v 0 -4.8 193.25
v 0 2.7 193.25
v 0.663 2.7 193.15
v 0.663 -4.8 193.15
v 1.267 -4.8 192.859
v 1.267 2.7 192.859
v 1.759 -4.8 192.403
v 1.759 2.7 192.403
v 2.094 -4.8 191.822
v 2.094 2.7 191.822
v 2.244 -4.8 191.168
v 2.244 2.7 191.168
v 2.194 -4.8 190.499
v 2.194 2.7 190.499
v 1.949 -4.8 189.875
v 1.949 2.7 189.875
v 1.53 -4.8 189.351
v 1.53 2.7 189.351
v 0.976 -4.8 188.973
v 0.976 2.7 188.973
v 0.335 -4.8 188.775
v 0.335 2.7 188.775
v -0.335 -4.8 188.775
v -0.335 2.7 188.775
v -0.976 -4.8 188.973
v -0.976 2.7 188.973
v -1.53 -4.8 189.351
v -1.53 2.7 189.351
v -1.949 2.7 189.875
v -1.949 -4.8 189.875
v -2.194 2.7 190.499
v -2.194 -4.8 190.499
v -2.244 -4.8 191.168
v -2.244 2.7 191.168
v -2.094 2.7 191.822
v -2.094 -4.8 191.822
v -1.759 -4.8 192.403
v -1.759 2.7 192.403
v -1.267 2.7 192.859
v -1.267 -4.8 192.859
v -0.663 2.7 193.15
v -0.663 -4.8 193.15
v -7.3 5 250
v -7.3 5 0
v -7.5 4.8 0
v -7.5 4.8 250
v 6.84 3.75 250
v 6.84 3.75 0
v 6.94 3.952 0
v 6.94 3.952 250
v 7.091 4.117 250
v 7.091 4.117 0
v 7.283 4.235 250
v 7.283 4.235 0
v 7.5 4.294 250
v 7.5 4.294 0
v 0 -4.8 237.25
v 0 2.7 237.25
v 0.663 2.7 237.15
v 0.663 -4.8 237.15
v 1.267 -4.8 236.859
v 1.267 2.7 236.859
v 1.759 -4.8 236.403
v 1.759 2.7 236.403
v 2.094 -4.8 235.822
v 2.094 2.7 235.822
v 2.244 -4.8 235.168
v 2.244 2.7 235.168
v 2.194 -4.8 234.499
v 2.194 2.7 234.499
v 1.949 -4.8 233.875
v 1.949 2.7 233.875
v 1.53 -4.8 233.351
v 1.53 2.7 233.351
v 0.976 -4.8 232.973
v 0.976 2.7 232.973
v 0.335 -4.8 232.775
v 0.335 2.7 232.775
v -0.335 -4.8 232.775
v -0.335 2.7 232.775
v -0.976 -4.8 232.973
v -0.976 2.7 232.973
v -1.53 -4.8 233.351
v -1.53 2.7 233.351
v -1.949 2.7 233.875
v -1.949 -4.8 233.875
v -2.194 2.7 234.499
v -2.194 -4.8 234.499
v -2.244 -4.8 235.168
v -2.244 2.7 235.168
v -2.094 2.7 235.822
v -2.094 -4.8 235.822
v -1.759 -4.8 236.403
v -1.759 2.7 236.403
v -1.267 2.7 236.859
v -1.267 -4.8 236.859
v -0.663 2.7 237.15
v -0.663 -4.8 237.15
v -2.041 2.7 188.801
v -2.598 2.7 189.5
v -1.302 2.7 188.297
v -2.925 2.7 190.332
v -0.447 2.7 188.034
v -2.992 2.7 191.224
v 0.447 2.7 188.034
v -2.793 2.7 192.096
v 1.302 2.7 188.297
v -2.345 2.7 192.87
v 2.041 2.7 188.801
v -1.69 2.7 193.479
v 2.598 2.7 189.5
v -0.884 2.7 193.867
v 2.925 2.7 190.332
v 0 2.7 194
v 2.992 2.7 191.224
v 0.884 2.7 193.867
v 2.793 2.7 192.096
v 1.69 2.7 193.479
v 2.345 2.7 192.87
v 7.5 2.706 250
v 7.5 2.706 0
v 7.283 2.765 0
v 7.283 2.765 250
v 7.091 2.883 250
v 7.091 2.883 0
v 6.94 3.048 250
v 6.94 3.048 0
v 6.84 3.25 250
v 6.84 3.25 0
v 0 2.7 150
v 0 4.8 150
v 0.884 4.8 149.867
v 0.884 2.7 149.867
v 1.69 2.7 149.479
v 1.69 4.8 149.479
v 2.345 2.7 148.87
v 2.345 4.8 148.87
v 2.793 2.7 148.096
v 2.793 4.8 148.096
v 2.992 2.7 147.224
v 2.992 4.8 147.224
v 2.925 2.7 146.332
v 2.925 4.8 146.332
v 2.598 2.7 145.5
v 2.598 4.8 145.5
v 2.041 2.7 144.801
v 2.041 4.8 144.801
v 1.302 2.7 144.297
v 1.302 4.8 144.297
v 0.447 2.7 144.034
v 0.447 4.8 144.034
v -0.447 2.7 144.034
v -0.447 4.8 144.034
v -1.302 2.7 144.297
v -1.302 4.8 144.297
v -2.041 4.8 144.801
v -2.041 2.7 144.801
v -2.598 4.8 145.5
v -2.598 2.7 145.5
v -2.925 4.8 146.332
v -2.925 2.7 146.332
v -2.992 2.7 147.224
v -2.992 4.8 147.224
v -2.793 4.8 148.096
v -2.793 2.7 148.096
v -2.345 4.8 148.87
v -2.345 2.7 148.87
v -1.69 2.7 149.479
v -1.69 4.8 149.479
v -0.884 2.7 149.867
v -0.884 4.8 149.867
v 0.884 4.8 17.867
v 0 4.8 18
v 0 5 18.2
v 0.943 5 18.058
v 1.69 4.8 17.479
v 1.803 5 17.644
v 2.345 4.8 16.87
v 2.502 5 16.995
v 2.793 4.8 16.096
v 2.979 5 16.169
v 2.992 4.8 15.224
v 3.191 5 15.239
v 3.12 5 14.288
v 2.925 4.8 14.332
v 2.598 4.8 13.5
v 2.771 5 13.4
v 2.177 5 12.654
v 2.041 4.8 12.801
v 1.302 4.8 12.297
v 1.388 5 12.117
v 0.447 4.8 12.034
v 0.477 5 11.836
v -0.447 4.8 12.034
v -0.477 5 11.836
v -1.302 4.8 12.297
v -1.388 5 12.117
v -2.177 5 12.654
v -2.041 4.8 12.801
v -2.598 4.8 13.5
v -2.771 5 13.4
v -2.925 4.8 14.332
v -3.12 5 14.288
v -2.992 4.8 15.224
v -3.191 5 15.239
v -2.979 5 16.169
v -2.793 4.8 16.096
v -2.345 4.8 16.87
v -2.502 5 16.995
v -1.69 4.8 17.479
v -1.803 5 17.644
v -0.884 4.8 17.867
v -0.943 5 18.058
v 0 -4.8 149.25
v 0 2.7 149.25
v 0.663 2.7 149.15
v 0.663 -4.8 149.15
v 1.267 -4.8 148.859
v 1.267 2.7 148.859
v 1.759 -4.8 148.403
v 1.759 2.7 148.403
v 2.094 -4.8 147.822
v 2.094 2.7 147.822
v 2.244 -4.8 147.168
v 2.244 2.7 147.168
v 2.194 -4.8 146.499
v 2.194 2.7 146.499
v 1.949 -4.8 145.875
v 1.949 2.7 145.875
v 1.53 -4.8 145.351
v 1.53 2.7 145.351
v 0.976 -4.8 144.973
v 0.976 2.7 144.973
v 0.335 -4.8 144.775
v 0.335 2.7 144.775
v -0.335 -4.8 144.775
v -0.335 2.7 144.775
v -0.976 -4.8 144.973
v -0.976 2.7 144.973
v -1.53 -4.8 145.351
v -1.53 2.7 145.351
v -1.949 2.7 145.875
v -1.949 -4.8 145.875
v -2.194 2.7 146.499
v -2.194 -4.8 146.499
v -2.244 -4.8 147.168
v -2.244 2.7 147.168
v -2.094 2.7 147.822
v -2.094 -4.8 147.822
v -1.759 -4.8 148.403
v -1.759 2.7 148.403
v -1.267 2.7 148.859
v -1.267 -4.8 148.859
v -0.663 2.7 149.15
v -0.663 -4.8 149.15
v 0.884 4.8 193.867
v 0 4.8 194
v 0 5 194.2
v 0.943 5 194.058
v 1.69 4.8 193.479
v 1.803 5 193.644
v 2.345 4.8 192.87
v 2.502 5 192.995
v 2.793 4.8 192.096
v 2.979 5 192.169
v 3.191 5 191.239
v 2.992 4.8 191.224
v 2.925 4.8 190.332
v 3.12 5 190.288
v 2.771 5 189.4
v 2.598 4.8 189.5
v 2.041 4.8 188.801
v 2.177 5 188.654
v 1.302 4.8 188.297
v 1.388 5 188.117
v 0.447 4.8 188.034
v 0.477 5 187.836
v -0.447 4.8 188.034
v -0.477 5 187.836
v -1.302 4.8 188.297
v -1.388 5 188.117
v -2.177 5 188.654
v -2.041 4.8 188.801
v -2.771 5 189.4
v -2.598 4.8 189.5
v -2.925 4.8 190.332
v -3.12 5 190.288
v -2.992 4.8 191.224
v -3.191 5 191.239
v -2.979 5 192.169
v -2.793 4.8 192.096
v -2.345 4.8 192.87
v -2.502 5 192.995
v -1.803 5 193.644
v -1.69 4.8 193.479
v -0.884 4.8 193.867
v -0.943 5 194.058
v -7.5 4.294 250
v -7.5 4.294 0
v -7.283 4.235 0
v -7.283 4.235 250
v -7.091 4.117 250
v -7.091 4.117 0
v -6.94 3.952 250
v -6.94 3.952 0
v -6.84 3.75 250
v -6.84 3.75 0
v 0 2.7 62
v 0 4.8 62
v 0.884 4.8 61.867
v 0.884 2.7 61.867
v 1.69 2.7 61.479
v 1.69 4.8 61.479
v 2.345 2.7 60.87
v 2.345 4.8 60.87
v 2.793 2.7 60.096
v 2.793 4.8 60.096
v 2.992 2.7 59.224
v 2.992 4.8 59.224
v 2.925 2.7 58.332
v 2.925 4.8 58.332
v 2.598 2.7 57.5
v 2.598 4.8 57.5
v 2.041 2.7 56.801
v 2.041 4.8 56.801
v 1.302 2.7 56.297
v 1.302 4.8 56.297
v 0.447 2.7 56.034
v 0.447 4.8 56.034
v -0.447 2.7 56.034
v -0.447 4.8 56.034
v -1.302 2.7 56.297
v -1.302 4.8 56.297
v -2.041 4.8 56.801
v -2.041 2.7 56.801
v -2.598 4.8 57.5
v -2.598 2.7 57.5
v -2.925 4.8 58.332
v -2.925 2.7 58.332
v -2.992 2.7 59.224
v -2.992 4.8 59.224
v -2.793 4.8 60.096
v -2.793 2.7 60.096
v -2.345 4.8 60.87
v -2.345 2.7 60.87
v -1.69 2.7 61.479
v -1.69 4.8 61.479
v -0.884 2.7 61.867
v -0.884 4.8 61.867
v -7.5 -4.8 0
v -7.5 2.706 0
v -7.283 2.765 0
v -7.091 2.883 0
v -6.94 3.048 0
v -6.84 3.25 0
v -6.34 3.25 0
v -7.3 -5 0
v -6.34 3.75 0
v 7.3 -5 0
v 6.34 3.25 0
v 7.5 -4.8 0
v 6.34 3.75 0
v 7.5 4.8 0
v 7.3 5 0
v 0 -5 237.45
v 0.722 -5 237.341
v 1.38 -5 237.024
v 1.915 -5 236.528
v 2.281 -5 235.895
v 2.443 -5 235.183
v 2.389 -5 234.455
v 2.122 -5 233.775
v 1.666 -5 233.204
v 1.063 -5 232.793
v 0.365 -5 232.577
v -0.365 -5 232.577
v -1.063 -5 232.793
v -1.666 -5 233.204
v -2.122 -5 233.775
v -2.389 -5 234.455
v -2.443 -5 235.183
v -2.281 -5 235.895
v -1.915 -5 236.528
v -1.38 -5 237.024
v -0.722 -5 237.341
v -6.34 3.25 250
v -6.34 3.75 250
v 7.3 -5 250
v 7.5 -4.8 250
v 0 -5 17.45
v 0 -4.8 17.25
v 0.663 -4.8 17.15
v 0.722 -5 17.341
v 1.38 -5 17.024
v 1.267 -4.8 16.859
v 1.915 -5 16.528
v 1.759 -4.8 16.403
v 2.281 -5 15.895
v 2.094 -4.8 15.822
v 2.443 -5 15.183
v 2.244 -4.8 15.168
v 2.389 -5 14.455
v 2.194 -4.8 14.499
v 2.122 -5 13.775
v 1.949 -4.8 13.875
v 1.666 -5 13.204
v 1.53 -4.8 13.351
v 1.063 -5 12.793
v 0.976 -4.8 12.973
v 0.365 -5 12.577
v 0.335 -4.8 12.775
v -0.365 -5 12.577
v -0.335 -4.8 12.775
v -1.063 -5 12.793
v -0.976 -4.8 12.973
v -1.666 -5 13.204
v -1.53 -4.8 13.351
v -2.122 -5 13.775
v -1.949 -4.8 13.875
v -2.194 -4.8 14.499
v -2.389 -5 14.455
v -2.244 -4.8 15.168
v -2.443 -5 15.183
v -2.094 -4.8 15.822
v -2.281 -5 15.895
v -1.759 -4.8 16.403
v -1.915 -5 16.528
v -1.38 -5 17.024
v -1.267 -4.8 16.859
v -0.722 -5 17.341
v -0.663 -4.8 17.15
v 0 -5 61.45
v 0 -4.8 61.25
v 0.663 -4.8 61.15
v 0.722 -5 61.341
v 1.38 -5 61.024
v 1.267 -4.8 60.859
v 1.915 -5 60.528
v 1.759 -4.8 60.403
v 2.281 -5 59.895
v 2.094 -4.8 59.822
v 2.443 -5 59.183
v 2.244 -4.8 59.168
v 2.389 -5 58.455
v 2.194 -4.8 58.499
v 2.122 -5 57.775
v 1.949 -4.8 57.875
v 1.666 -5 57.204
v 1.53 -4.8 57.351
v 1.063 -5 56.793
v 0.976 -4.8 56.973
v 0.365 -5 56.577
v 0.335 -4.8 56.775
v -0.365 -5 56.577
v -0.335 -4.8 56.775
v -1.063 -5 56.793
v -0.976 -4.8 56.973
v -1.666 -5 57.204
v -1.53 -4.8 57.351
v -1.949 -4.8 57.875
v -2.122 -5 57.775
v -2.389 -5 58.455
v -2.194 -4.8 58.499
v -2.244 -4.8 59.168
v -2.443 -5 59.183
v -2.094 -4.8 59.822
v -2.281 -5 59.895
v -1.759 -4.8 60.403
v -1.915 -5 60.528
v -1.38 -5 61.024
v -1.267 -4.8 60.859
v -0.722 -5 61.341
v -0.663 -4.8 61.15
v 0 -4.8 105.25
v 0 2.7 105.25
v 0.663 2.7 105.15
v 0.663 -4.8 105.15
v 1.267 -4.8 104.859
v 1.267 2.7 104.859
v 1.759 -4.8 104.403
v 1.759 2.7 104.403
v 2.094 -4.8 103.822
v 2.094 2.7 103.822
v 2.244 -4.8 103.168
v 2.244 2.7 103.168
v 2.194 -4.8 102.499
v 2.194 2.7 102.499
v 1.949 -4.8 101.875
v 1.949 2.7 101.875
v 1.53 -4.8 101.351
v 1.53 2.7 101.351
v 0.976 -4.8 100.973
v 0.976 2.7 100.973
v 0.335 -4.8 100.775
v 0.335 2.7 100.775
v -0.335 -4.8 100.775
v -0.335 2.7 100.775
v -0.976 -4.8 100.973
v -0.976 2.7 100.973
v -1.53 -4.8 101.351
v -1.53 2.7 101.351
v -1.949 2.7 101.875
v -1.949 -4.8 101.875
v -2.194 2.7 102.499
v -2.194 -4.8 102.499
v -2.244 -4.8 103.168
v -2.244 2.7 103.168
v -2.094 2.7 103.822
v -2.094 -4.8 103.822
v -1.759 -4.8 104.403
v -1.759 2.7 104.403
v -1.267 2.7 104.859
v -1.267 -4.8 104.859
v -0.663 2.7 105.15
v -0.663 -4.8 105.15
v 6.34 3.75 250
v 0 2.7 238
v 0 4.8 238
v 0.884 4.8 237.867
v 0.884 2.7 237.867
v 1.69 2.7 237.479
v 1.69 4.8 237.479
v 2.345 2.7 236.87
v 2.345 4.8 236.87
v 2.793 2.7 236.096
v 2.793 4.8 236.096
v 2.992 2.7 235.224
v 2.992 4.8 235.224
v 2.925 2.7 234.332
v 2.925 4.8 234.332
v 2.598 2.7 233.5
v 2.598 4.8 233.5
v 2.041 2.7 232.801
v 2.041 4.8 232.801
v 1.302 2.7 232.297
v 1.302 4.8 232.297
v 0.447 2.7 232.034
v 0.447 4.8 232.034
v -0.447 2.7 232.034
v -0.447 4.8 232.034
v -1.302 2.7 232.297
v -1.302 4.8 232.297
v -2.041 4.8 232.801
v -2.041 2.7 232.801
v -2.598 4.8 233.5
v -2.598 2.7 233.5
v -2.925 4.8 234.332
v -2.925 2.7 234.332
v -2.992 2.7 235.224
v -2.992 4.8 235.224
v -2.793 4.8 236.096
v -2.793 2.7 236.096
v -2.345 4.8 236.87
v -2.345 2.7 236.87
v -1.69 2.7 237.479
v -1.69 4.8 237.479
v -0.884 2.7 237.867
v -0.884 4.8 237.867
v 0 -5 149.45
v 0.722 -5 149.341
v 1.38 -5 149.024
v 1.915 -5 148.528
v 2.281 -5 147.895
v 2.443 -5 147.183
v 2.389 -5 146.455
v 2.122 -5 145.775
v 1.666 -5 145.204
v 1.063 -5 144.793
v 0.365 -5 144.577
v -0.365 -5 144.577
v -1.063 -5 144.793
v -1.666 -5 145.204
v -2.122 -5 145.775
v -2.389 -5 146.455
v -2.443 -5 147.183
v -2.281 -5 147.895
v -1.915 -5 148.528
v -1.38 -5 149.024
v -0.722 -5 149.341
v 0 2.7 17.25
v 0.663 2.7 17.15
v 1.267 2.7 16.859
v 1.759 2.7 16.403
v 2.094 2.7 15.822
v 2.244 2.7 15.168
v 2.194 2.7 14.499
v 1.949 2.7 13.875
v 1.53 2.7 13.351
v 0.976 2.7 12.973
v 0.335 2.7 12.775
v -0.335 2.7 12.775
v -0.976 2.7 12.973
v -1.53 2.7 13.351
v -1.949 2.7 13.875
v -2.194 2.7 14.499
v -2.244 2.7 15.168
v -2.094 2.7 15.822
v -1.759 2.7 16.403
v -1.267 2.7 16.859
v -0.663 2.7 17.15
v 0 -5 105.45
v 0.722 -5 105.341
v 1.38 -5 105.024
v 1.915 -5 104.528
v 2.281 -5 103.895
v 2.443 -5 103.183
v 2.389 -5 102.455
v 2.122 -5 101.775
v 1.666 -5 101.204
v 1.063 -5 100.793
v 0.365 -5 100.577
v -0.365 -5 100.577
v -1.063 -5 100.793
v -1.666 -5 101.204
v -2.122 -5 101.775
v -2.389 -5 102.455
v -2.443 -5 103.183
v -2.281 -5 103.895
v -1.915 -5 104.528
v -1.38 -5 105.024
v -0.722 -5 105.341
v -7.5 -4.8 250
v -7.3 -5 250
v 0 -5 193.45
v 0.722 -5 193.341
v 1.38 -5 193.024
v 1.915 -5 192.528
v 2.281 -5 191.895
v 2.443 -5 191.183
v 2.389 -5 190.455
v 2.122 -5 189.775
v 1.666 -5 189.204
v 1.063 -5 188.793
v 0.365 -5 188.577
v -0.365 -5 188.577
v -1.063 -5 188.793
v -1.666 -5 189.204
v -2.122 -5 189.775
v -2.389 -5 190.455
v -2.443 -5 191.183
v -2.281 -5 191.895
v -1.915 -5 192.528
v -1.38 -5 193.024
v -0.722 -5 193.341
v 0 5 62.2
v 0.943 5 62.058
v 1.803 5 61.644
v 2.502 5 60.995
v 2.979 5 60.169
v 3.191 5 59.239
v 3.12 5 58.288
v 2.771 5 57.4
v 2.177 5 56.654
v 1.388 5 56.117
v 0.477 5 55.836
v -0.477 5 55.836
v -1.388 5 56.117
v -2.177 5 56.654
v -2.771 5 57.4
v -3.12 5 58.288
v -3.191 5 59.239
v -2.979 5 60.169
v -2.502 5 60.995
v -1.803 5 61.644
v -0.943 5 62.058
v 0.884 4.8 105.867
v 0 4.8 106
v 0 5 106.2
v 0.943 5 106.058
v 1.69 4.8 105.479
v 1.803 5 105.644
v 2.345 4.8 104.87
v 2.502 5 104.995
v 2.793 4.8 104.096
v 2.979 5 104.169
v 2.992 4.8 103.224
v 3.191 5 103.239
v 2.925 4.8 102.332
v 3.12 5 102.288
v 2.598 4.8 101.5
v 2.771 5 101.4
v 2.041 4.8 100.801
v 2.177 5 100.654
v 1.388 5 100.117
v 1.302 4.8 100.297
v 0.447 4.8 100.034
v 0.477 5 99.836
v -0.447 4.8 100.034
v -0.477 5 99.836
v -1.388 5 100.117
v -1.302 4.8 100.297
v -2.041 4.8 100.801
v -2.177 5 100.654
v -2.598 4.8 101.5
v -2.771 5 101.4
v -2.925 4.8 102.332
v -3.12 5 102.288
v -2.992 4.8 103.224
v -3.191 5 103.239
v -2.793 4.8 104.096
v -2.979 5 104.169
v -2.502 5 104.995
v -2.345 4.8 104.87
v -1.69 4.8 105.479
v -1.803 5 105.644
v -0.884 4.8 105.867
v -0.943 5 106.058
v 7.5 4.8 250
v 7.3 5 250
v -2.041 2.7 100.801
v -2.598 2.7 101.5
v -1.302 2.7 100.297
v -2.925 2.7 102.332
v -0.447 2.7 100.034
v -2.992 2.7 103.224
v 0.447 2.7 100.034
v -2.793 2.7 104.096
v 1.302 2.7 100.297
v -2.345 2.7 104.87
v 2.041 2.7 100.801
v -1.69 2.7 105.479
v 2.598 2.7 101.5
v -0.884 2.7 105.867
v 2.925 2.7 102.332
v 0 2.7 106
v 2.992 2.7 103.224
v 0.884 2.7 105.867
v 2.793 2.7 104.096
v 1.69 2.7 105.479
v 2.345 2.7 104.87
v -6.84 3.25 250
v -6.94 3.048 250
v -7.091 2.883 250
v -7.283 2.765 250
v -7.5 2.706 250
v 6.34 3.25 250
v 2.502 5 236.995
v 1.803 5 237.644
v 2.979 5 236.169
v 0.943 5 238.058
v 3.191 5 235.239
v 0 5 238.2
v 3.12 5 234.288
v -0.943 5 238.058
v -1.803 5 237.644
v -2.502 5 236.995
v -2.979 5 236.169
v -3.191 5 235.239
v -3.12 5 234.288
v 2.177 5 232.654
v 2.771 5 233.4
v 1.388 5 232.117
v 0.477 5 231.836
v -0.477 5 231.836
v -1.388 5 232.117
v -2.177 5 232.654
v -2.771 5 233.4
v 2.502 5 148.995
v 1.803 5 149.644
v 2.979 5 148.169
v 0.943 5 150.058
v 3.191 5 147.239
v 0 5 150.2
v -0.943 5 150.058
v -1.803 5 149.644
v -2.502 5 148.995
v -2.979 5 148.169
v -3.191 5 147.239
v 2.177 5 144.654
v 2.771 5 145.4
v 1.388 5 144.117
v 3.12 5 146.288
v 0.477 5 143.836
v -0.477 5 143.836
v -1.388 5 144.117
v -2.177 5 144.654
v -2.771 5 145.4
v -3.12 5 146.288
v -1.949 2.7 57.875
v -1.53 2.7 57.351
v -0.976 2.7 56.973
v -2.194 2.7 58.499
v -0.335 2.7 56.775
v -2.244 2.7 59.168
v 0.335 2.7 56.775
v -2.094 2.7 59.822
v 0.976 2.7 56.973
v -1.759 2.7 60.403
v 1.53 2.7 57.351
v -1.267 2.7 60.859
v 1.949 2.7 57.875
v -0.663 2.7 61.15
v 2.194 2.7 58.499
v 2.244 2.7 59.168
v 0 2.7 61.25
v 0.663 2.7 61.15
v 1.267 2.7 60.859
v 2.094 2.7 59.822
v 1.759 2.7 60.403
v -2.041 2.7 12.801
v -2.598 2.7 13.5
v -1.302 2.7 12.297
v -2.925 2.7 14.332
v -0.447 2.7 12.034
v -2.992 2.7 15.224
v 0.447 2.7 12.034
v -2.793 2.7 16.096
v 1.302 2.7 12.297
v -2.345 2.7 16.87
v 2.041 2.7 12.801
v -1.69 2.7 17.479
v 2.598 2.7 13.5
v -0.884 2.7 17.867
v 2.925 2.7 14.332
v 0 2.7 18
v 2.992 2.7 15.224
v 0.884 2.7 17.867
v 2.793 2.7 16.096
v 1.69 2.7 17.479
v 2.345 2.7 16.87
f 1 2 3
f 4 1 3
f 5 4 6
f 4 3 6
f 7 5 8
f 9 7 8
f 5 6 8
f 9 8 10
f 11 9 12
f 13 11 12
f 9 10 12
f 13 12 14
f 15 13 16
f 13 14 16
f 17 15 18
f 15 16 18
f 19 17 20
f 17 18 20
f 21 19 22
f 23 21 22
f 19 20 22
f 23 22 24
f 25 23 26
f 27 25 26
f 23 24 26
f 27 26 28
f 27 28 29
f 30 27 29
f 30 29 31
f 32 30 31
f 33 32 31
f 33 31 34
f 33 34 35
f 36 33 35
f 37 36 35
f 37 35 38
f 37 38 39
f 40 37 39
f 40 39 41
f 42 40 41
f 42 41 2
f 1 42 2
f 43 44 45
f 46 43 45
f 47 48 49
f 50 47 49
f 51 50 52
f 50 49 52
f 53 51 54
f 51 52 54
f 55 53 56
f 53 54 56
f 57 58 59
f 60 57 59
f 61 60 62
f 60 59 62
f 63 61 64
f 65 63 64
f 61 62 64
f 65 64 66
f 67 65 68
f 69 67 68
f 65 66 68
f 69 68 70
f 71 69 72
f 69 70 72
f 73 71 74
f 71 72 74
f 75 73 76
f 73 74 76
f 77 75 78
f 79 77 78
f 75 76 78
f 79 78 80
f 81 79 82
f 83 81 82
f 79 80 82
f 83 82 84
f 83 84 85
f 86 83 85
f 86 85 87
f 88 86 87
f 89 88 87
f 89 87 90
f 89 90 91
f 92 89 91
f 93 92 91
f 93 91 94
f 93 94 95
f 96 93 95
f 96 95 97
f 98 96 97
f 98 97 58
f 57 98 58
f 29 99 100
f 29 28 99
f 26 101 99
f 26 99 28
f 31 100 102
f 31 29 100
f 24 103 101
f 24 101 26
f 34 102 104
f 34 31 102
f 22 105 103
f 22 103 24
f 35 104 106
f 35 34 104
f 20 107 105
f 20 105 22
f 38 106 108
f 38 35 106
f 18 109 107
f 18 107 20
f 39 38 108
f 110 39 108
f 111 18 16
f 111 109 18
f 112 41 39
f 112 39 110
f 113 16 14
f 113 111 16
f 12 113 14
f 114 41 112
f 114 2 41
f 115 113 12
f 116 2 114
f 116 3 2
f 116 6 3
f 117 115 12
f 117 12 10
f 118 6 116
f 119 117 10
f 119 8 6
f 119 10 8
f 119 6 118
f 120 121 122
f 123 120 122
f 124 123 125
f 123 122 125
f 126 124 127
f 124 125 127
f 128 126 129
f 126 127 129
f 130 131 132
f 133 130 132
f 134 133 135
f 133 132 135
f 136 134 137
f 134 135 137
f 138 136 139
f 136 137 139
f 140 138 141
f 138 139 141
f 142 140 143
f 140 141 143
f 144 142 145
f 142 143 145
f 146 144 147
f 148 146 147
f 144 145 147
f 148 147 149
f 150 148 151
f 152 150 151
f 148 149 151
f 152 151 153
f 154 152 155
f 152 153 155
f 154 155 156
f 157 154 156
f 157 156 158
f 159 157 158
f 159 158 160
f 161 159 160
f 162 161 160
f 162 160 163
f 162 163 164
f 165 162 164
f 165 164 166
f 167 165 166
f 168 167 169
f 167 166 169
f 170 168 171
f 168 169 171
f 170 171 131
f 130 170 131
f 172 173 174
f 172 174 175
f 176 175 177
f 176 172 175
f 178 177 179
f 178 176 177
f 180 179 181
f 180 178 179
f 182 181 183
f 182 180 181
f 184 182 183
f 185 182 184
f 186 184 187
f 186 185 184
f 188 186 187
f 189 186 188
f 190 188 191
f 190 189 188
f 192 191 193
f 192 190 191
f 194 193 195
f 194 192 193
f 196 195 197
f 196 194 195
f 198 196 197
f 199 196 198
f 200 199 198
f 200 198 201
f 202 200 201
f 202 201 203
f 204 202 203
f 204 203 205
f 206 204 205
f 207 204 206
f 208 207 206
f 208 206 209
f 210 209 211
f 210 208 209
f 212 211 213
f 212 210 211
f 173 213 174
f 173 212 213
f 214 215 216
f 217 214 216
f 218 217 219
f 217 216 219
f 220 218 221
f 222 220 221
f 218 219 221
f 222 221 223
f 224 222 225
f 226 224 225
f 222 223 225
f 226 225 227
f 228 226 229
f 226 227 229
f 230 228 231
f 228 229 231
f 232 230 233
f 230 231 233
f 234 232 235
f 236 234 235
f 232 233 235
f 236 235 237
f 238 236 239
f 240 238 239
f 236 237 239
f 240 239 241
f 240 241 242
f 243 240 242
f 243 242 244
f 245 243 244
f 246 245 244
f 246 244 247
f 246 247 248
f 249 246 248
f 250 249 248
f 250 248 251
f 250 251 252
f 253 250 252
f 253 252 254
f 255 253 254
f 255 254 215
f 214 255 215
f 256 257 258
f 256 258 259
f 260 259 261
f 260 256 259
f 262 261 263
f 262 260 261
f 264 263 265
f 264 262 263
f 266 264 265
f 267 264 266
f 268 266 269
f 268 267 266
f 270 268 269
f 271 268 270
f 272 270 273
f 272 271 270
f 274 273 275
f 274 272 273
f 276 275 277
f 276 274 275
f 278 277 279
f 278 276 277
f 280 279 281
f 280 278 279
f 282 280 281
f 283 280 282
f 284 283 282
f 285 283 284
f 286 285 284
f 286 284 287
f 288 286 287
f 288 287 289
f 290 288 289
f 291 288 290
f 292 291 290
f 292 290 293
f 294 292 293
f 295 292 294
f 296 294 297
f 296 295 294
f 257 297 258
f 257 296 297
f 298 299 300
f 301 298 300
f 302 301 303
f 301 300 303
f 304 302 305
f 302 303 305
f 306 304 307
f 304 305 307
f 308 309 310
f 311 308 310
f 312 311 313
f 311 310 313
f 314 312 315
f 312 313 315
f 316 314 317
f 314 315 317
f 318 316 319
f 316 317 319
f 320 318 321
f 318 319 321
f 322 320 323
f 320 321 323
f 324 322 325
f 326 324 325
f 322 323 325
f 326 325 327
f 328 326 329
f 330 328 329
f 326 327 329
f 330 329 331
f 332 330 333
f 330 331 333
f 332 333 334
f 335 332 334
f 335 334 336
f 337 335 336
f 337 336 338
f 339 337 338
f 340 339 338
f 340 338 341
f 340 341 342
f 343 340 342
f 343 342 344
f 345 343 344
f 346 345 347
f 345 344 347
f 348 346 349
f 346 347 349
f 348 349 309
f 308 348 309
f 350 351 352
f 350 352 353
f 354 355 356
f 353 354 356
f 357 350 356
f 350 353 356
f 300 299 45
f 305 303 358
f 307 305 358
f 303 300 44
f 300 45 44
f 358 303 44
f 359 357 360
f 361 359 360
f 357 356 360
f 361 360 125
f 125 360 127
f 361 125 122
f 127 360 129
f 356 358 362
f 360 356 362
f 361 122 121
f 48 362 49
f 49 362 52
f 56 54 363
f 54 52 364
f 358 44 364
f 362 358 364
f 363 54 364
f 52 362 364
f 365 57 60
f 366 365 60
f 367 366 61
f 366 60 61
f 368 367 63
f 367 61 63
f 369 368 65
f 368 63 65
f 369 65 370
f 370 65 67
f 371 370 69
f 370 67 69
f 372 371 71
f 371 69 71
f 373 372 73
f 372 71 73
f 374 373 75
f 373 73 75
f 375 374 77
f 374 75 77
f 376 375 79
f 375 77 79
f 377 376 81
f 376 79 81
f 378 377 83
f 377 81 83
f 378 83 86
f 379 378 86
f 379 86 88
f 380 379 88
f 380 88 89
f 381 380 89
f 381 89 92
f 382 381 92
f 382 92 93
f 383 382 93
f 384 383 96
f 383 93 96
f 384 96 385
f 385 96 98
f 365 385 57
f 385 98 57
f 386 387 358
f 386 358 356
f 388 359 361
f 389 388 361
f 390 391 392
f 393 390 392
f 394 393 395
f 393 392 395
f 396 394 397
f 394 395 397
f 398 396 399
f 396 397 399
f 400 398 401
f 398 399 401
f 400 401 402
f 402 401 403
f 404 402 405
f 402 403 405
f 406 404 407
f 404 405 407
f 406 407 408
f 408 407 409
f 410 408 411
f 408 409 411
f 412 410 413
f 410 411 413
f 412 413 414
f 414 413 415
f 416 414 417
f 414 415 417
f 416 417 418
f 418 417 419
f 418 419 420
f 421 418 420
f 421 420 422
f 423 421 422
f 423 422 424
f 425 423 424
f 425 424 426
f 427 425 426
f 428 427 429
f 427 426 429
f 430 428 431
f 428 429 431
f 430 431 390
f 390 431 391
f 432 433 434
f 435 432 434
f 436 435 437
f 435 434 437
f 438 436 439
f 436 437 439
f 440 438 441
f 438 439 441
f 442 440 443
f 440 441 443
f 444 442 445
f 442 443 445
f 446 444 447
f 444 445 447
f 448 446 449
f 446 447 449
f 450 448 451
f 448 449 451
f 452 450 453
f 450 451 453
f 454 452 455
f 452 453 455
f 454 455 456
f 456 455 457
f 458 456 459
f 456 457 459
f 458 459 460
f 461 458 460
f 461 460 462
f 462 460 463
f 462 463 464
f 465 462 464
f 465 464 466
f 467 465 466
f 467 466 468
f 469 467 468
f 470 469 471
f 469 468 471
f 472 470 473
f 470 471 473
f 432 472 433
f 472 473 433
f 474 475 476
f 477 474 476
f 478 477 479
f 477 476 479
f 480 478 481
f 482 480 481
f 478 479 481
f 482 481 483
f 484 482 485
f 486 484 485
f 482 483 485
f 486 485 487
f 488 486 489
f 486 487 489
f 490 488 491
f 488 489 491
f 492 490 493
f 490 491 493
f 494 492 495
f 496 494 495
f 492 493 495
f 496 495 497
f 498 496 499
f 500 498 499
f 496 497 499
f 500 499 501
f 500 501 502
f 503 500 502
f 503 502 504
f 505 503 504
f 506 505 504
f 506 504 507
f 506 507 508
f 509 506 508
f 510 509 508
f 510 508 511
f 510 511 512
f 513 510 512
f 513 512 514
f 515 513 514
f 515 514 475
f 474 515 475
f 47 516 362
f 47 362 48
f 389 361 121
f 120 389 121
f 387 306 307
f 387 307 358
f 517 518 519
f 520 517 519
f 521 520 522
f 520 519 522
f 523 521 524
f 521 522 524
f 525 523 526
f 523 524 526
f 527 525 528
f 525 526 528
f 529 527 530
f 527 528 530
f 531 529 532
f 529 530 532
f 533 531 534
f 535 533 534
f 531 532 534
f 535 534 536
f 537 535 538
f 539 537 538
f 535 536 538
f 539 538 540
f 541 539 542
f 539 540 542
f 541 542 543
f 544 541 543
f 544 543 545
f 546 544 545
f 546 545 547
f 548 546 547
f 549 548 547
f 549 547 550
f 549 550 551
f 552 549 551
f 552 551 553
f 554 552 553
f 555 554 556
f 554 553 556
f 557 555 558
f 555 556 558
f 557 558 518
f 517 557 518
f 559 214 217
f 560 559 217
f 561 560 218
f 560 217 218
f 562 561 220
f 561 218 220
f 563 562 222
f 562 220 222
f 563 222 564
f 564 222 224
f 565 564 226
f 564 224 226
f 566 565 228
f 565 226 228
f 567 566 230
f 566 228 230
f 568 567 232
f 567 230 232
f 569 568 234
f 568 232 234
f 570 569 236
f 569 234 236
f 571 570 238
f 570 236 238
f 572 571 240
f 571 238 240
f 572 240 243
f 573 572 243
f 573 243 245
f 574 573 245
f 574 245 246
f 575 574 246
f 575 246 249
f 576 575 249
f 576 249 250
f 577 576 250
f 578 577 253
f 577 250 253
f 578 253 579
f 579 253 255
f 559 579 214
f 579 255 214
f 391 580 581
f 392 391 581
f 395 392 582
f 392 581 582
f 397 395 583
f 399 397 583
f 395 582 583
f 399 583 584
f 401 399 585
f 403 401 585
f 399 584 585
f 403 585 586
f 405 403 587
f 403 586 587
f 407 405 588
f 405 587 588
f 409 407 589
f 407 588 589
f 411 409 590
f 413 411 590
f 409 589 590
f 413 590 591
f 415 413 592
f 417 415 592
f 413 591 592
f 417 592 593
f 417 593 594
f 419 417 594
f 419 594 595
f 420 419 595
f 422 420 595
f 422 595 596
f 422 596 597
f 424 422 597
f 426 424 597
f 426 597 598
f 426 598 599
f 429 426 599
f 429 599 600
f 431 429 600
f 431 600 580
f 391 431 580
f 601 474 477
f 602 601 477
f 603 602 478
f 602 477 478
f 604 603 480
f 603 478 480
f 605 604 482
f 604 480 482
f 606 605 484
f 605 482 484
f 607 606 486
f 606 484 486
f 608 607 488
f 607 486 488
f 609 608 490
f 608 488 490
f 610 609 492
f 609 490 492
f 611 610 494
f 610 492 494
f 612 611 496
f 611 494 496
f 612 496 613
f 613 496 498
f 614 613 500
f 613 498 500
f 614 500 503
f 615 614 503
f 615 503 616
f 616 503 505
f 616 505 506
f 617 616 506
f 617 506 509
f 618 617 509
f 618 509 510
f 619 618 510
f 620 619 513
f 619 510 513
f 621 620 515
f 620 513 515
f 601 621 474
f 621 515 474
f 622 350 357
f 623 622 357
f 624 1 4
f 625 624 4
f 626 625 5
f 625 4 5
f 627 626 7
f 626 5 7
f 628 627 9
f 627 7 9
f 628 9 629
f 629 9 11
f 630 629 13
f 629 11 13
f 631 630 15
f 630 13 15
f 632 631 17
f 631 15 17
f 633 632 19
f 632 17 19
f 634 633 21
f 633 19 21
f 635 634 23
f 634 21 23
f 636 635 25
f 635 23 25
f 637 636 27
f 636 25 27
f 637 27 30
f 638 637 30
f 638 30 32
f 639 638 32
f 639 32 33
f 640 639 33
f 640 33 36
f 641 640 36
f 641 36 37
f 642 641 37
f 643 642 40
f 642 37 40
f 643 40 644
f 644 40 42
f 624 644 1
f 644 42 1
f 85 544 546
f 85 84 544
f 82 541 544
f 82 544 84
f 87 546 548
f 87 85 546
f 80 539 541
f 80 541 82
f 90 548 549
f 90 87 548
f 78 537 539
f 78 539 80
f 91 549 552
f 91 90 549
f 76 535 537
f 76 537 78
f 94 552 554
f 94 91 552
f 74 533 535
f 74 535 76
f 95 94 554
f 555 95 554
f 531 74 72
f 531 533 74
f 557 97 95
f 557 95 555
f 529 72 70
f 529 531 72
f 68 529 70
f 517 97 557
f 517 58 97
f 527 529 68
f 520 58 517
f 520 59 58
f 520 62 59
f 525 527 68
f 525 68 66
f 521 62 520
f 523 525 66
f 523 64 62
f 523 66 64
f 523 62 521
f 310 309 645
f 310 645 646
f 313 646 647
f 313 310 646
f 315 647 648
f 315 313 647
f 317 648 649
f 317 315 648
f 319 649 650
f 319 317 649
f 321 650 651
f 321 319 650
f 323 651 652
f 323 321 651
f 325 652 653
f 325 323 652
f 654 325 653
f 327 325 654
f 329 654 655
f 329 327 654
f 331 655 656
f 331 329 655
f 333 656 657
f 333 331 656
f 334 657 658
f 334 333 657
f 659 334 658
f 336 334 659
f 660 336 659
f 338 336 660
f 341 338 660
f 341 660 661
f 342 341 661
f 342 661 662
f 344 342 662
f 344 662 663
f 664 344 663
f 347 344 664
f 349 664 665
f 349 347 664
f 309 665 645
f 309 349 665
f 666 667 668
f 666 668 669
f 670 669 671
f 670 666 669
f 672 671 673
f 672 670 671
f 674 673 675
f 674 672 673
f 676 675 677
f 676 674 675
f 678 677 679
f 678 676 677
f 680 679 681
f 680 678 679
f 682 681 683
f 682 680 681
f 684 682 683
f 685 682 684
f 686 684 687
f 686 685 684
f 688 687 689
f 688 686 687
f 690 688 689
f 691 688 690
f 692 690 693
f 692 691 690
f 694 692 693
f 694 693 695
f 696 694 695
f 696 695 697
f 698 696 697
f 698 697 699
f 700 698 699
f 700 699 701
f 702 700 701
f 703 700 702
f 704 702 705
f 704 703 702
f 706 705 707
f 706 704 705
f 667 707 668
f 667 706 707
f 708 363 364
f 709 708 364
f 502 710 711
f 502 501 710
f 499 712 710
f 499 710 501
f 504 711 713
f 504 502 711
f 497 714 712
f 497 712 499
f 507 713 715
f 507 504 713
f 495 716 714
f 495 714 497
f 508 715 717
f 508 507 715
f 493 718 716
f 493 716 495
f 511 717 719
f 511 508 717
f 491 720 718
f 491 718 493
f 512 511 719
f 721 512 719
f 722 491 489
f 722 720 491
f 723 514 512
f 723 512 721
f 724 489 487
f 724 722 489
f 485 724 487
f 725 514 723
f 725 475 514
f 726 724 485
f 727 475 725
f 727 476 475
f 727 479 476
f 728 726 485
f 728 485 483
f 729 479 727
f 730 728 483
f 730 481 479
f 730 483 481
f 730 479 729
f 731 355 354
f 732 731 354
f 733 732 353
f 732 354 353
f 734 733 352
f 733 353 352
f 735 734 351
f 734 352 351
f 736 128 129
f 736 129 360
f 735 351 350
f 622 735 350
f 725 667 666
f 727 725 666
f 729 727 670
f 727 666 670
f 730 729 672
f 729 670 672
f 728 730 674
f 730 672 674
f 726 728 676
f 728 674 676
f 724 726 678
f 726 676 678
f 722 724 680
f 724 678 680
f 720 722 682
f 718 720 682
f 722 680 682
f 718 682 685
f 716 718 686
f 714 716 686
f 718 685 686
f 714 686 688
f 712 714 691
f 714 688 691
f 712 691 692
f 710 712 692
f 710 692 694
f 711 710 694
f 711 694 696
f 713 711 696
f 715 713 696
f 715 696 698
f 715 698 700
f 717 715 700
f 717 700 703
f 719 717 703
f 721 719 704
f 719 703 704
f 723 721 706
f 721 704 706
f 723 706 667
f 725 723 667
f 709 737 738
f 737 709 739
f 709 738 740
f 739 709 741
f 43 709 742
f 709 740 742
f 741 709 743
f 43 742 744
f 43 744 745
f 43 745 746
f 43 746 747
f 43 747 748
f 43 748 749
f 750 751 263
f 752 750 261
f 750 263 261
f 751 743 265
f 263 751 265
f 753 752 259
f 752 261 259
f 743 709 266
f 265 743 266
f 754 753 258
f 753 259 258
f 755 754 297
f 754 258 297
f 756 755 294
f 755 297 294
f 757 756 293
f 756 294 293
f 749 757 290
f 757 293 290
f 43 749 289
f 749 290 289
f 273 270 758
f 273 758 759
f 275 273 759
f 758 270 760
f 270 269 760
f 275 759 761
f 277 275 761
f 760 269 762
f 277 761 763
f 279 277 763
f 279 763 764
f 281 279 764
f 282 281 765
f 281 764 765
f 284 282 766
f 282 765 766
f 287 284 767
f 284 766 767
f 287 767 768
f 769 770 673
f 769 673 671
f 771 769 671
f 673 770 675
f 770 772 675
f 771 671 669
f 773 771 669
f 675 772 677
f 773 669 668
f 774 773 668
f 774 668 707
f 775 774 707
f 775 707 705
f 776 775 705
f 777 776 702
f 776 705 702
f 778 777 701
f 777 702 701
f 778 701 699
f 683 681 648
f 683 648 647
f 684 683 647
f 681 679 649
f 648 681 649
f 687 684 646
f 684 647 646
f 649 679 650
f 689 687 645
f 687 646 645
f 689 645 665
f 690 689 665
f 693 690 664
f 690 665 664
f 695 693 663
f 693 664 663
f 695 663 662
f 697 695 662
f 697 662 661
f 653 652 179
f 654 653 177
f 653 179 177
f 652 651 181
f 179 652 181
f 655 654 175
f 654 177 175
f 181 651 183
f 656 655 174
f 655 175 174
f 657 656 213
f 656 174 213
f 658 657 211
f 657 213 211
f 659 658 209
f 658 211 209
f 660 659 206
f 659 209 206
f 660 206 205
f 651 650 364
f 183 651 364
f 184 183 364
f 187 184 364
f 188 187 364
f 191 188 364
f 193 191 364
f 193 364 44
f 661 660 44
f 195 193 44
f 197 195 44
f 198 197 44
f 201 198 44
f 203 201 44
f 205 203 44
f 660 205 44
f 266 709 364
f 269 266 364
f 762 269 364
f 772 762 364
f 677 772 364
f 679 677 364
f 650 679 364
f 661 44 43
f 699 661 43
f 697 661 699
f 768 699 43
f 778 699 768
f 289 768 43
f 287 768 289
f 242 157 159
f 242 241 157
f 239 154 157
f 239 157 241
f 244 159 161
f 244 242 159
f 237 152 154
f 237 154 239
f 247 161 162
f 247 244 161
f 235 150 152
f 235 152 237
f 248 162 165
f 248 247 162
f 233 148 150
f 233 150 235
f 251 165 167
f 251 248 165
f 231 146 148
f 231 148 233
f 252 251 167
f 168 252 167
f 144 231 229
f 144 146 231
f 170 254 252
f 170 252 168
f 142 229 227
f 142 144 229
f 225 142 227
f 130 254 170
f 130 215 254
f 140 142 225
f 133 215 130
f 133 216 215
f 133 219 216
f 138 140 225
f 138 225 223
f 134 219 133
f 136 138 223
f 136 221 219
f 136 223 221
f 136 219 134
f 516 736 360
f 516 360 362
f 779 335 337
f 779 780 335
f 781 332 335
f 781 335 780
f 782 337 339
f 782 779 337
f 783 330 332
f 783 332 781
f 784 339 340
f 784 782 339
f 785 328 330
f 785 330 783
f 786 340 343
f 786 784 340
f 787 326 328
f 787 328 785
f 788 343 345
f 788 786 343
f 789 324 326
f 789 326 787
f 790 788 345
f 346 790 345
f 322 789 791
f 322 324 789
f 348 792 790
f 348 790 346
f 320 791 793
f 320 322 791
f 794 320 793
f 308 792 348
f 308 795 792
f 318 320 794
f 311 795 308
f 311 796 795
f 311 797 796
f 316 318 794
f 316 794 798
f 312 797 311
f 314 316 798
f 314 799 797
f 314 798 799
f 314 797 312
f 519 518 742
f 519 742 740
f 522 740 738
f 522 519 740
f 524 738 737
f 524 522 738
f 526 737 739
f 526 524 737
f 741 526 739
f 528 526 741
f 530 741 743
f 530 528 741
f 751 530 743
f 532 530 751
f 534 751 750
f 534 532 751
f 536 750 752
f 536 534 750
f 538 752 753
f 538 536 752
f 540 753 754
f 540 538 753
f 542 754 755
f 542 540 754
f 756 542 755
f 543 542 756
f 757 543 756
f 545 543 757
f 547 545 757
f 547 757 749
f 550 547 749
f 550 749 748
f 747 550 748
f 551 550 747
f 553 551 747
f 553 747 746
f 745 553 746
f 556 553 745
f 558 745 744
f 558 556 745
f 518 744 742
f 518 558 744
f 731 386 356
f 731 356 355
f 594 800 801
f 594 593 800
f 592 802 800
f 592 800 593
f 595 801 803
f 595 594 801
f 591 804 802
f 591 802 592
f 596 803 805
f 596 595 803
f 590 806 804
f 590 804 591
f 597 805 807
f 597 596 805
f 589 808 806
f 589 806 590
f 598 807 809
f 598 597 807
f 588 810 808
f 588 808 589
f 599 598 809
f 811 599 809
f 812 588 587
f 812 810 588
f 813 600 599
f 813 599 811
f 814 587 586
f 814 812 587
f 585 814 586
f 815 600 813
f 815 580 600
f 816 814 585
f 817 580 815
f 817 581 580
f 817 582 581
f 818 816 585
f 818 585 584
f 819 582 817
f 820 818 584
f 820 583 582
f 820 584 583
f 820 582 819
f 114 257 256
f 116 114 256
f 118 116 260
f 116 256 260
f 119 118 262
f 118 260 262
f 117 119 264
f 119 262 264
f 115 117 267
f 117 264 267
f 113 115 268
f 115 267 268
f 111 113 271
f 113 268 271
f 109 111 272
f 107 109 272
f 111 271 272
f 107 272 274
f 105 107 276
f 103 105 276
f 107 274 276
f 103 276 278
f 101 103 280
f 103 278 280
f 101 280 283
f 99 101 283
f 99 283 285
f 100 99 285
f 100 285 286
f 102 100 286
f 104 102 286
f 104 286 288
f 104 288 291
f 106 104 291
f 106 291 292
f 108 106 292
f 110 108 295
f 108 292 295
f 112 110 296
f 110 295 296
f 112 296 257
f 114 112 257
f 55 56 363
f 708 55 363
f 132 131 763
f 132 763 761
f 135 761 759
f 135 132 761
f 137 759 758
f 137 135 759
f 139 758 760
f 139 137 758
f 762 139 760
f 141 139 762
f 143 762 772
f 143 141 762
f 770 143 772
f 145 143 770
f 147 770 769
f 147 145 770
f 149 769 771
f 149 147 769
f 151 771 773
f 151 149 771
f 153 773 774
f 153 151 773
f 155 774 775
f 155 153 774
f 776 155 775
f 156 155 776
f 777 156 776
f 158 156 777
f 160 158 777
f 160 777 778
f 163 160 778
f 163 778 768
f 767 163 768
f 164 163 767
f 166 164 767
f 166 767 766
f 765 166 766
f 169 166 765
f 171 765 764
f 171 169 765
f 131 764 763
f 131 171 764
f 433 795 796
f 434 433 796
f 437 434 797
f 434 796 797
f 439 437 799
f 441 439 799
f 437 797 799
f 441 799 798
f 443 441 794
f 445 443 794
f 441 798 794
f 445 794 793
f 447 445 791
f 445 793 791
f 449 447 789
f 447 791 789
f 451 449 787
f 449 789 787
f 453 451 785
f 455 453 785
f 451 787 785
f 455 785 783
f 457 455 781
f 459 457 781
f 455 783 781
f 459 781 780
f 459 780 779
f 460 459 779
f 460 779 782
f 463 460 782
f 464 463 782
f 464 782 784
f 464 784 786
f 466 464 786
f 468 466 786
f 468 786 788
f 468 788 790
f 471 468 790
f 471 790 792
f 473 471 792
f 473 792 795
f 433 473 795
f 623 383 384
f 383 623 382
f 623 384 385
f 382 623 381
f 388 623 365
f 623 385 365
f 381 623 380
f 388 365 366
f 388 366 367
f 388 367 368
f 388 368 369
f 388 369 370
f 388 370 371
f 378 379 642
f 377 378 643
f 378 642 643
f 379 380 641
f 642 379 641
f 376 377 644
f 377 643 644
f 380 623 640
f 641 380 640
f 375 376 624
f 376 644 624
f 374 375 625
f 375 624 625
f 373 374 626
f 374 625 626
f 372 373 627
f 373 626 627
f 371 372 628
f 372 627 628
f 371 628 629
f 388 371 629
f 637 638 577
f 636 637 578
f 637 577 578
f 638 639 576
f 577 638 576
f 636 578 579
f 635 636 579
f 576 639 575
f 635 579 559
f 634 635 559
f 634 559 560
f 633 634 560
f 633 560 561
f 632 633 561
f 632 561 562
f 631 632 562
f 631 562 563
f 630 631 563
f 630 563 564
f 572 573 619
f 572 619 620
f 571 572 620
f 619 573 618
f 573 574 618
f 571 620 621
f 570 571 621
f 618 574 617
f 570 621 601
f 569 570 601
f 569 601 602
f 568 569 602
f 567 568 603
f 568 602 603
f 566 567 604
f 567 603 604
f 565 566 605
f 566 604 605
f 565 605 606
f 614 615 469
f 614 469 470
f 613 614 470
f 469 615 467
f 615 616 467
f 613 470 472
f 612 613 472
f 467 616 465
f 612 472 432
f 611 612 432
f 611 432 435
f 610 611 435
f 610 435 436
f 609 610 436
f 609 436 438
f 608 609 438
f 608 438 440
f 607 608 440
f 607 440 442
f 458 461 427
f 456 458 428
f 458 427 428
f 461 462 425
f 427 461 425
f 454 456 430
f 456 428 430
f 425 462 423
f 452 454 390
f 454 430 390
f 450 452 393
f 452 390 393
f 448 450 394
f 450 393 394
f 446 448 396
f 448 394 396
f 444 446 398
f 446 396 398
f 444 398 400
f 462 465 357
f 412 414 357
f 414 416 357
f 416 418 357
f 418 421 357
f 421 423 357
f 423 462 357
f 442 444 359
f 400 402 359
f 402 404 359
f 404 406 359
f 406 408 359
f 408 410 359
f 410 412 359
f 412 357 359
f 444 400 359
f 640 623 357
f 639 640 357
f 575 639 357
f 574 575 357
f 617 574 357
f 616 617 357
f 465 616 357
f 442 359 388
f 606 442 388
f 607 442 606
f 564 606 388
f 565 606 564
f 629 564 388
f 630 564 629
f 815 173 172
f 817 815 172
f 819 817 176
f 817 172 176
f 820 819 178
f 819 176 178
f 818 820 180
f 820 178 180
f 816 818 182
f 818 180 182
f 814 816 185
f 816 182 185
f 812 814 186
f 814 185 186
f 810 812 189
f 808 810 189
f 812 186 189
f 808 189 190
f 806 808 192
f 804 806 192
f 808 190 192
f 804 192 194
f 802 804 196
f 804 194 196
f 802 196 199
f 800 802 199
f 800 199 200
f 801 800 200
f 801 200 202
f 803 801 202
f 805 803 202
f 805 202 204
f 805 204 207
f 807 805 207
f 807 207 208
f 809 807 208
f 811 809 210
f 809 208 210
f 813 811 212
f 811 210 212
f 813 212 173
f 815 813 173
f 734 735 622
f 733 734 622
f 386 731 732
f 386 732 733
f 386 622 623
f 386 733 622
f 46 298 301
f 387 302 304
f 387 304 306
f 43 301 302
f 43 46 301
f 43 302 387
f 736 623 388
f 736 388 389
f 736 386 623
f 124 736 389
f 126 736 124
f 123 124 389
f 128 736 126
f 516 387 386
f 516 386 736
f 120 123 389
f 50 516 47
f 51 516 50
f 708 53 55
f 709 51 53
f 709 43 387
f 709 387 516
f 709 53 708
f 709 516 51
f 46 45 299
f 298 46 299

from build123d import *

# Parameters (mm, degrees)
EXTRUDE1_DEPTH             = 250
EXTRUDE2_REACH             = 252.312
SKETCH2_R                  = 2.25
SKETCH_R                   = 3
SKETCH_R_2                 = 2.25
EXTRUDE4_DEPTH             = 2.3
CHAMFER1_SIZE              = 0.2
LPATTERN1_COUNT            = 6
LPATTERN1_PITCH            = 44
CHAMFER1_OF_LPATTERN1_SIZE = 0.2


with BuildPart() as part:
    # Sketch1 → Extrude1 (new body)
    with BuildSketch(Plane.XY):
        with BuildLine():
            Line((-7.3, -5), (7.3, -5))
            Line((7.3, -5), (7.5, -4.8))
            Line((7.5, -4.8), (7.5, 2.706274607))
            ThreePointArc((7.5, 2.706274607), (7.091294745, 2.882570681), (6.840065792, 3.25))
            Line((6.840065792, 3.25), (6.340065792, 3.25))
            Line((6.340065792, 3.25), (6.340065792, 3.75))
            Line((6.340065792, 3.75), (6.840065792, 3.75))
            ThreePointArc((6.840065792, 3.75), (7.091294745, 4.117429319), (7.5, 4.293725393))
            Line((7.5, 4.293725393), (7.5, 4.8))
            Line((7.5, 4.8), (7.3, 5))
            Line((7.3, 5), (-7.3, 5))
            Line((-7.3, 5), (-7.5, 4.8))
            Line((-7.5, 4.8), (-7.5, 4.293725393))
            ThreePointArc((-7.5, 4.293725393), (-7.091294745, 4.117429319), (-6.840065792, 3.75))
            Line((-6.840065792, 3.75), (-6.340065792, 3.75))
            Line((-6.340065792, 3.75), (-6.340065792, 3.25))
            Line((-6.340065792, 3.25), (-6.840065792, 3.25))
            ThreePointArc((-6.840065792, 3.25), (-7.091294745, 2.882570681), (-7.5, 2.706274607))
            Line((-7.5, 2.706274607), (-7.5, -4.8))
            Line((-7.5, -4.8), (-7.3, -5))
        make_face()
    extrude(amount=EXTRUDE1_DEPTH)

    # Sketch2 → Extrude2 (cut, up to next)
    with BuildSketch(Plane(origin=(0, 5, 0), x_dir=(1, 0, 0), z_dir=(0, 1, 0)), mode=Mode.PRIVATE) as extrude2_sk1:
        with Locations(Location((0, -15, 0), (0, 0, 270))):
            Circle(SKETCH2_R)
    extrude2_tool1 = extrude(extrude2_sk1.sketch, amount=-EXTRUDE2_REACH, mode=Mode.PRIVATE) & part.part
    extrude2 = extrude2_tool1.solids().sort_by_distance((0, 5, 15))[0]
    add(extrude2, mode=Mode.SUBTRACT)

    # Sketch → Extrude4 (cut)
    with BuildSketch(Plane(origin=(0, 5, 0), x_dir=(1, 0, 0), z_dir=(0, 1, 0))):
        with Locations(Location((0, -15, 0), (0, 0, 270))):
            Circle(SKETCH_R)
        with Locations(Location((0, -15, 0), (0, 0, 270))):
            Circle(SKETCH_R_2, mode=Mode.SUBTRACT)
    extrude4 = extrude(amount=-EXTRUDE4_DEPTH, mode=Mode.SUBTRACT)

    # Chamfer1
    chamfer1_edges = [part.edges().sort_by_distance(p)[0] for p in [
        (0, -5, 12.75),
        (0, 5, 12),
    ]]
    chamfer(chamfer1_edges, length=CHAMFER1_SIZE)

    # LPattern1: Extrude2, Extrude4 ×6
    with Locations(*[(0, 0, i * LPATTERN1_PITCH) for i in range(1, LPATTERN1_COUNT)]):
        add(extrude2, mode=Mode.SUBTRACT)
        add(extrude4, mode=Mode.SUBTRACT)

    # Chamfer1 of LPattern1
    chamfer1_of_lpattern1_edges = [part.edges().sort_by_distance(p)[0] for p in [
        (0, -5, 56.75),
        (0, 5, 56),
        (0, -5, 100.75),
        (0, 5, 100),
        (0, -5, 144.75),
        (0, 5, 144),
        (0, -5, 188.75),
        (0, 5, 188),
        (0, -5, 232.75),
        (0, 5, 232),
    ]]
    chamfer(chamfer1_of_lpattern1_edges, length=CHAMFER1_OF_LPATTERN1_SIZE)


solid = part.part
